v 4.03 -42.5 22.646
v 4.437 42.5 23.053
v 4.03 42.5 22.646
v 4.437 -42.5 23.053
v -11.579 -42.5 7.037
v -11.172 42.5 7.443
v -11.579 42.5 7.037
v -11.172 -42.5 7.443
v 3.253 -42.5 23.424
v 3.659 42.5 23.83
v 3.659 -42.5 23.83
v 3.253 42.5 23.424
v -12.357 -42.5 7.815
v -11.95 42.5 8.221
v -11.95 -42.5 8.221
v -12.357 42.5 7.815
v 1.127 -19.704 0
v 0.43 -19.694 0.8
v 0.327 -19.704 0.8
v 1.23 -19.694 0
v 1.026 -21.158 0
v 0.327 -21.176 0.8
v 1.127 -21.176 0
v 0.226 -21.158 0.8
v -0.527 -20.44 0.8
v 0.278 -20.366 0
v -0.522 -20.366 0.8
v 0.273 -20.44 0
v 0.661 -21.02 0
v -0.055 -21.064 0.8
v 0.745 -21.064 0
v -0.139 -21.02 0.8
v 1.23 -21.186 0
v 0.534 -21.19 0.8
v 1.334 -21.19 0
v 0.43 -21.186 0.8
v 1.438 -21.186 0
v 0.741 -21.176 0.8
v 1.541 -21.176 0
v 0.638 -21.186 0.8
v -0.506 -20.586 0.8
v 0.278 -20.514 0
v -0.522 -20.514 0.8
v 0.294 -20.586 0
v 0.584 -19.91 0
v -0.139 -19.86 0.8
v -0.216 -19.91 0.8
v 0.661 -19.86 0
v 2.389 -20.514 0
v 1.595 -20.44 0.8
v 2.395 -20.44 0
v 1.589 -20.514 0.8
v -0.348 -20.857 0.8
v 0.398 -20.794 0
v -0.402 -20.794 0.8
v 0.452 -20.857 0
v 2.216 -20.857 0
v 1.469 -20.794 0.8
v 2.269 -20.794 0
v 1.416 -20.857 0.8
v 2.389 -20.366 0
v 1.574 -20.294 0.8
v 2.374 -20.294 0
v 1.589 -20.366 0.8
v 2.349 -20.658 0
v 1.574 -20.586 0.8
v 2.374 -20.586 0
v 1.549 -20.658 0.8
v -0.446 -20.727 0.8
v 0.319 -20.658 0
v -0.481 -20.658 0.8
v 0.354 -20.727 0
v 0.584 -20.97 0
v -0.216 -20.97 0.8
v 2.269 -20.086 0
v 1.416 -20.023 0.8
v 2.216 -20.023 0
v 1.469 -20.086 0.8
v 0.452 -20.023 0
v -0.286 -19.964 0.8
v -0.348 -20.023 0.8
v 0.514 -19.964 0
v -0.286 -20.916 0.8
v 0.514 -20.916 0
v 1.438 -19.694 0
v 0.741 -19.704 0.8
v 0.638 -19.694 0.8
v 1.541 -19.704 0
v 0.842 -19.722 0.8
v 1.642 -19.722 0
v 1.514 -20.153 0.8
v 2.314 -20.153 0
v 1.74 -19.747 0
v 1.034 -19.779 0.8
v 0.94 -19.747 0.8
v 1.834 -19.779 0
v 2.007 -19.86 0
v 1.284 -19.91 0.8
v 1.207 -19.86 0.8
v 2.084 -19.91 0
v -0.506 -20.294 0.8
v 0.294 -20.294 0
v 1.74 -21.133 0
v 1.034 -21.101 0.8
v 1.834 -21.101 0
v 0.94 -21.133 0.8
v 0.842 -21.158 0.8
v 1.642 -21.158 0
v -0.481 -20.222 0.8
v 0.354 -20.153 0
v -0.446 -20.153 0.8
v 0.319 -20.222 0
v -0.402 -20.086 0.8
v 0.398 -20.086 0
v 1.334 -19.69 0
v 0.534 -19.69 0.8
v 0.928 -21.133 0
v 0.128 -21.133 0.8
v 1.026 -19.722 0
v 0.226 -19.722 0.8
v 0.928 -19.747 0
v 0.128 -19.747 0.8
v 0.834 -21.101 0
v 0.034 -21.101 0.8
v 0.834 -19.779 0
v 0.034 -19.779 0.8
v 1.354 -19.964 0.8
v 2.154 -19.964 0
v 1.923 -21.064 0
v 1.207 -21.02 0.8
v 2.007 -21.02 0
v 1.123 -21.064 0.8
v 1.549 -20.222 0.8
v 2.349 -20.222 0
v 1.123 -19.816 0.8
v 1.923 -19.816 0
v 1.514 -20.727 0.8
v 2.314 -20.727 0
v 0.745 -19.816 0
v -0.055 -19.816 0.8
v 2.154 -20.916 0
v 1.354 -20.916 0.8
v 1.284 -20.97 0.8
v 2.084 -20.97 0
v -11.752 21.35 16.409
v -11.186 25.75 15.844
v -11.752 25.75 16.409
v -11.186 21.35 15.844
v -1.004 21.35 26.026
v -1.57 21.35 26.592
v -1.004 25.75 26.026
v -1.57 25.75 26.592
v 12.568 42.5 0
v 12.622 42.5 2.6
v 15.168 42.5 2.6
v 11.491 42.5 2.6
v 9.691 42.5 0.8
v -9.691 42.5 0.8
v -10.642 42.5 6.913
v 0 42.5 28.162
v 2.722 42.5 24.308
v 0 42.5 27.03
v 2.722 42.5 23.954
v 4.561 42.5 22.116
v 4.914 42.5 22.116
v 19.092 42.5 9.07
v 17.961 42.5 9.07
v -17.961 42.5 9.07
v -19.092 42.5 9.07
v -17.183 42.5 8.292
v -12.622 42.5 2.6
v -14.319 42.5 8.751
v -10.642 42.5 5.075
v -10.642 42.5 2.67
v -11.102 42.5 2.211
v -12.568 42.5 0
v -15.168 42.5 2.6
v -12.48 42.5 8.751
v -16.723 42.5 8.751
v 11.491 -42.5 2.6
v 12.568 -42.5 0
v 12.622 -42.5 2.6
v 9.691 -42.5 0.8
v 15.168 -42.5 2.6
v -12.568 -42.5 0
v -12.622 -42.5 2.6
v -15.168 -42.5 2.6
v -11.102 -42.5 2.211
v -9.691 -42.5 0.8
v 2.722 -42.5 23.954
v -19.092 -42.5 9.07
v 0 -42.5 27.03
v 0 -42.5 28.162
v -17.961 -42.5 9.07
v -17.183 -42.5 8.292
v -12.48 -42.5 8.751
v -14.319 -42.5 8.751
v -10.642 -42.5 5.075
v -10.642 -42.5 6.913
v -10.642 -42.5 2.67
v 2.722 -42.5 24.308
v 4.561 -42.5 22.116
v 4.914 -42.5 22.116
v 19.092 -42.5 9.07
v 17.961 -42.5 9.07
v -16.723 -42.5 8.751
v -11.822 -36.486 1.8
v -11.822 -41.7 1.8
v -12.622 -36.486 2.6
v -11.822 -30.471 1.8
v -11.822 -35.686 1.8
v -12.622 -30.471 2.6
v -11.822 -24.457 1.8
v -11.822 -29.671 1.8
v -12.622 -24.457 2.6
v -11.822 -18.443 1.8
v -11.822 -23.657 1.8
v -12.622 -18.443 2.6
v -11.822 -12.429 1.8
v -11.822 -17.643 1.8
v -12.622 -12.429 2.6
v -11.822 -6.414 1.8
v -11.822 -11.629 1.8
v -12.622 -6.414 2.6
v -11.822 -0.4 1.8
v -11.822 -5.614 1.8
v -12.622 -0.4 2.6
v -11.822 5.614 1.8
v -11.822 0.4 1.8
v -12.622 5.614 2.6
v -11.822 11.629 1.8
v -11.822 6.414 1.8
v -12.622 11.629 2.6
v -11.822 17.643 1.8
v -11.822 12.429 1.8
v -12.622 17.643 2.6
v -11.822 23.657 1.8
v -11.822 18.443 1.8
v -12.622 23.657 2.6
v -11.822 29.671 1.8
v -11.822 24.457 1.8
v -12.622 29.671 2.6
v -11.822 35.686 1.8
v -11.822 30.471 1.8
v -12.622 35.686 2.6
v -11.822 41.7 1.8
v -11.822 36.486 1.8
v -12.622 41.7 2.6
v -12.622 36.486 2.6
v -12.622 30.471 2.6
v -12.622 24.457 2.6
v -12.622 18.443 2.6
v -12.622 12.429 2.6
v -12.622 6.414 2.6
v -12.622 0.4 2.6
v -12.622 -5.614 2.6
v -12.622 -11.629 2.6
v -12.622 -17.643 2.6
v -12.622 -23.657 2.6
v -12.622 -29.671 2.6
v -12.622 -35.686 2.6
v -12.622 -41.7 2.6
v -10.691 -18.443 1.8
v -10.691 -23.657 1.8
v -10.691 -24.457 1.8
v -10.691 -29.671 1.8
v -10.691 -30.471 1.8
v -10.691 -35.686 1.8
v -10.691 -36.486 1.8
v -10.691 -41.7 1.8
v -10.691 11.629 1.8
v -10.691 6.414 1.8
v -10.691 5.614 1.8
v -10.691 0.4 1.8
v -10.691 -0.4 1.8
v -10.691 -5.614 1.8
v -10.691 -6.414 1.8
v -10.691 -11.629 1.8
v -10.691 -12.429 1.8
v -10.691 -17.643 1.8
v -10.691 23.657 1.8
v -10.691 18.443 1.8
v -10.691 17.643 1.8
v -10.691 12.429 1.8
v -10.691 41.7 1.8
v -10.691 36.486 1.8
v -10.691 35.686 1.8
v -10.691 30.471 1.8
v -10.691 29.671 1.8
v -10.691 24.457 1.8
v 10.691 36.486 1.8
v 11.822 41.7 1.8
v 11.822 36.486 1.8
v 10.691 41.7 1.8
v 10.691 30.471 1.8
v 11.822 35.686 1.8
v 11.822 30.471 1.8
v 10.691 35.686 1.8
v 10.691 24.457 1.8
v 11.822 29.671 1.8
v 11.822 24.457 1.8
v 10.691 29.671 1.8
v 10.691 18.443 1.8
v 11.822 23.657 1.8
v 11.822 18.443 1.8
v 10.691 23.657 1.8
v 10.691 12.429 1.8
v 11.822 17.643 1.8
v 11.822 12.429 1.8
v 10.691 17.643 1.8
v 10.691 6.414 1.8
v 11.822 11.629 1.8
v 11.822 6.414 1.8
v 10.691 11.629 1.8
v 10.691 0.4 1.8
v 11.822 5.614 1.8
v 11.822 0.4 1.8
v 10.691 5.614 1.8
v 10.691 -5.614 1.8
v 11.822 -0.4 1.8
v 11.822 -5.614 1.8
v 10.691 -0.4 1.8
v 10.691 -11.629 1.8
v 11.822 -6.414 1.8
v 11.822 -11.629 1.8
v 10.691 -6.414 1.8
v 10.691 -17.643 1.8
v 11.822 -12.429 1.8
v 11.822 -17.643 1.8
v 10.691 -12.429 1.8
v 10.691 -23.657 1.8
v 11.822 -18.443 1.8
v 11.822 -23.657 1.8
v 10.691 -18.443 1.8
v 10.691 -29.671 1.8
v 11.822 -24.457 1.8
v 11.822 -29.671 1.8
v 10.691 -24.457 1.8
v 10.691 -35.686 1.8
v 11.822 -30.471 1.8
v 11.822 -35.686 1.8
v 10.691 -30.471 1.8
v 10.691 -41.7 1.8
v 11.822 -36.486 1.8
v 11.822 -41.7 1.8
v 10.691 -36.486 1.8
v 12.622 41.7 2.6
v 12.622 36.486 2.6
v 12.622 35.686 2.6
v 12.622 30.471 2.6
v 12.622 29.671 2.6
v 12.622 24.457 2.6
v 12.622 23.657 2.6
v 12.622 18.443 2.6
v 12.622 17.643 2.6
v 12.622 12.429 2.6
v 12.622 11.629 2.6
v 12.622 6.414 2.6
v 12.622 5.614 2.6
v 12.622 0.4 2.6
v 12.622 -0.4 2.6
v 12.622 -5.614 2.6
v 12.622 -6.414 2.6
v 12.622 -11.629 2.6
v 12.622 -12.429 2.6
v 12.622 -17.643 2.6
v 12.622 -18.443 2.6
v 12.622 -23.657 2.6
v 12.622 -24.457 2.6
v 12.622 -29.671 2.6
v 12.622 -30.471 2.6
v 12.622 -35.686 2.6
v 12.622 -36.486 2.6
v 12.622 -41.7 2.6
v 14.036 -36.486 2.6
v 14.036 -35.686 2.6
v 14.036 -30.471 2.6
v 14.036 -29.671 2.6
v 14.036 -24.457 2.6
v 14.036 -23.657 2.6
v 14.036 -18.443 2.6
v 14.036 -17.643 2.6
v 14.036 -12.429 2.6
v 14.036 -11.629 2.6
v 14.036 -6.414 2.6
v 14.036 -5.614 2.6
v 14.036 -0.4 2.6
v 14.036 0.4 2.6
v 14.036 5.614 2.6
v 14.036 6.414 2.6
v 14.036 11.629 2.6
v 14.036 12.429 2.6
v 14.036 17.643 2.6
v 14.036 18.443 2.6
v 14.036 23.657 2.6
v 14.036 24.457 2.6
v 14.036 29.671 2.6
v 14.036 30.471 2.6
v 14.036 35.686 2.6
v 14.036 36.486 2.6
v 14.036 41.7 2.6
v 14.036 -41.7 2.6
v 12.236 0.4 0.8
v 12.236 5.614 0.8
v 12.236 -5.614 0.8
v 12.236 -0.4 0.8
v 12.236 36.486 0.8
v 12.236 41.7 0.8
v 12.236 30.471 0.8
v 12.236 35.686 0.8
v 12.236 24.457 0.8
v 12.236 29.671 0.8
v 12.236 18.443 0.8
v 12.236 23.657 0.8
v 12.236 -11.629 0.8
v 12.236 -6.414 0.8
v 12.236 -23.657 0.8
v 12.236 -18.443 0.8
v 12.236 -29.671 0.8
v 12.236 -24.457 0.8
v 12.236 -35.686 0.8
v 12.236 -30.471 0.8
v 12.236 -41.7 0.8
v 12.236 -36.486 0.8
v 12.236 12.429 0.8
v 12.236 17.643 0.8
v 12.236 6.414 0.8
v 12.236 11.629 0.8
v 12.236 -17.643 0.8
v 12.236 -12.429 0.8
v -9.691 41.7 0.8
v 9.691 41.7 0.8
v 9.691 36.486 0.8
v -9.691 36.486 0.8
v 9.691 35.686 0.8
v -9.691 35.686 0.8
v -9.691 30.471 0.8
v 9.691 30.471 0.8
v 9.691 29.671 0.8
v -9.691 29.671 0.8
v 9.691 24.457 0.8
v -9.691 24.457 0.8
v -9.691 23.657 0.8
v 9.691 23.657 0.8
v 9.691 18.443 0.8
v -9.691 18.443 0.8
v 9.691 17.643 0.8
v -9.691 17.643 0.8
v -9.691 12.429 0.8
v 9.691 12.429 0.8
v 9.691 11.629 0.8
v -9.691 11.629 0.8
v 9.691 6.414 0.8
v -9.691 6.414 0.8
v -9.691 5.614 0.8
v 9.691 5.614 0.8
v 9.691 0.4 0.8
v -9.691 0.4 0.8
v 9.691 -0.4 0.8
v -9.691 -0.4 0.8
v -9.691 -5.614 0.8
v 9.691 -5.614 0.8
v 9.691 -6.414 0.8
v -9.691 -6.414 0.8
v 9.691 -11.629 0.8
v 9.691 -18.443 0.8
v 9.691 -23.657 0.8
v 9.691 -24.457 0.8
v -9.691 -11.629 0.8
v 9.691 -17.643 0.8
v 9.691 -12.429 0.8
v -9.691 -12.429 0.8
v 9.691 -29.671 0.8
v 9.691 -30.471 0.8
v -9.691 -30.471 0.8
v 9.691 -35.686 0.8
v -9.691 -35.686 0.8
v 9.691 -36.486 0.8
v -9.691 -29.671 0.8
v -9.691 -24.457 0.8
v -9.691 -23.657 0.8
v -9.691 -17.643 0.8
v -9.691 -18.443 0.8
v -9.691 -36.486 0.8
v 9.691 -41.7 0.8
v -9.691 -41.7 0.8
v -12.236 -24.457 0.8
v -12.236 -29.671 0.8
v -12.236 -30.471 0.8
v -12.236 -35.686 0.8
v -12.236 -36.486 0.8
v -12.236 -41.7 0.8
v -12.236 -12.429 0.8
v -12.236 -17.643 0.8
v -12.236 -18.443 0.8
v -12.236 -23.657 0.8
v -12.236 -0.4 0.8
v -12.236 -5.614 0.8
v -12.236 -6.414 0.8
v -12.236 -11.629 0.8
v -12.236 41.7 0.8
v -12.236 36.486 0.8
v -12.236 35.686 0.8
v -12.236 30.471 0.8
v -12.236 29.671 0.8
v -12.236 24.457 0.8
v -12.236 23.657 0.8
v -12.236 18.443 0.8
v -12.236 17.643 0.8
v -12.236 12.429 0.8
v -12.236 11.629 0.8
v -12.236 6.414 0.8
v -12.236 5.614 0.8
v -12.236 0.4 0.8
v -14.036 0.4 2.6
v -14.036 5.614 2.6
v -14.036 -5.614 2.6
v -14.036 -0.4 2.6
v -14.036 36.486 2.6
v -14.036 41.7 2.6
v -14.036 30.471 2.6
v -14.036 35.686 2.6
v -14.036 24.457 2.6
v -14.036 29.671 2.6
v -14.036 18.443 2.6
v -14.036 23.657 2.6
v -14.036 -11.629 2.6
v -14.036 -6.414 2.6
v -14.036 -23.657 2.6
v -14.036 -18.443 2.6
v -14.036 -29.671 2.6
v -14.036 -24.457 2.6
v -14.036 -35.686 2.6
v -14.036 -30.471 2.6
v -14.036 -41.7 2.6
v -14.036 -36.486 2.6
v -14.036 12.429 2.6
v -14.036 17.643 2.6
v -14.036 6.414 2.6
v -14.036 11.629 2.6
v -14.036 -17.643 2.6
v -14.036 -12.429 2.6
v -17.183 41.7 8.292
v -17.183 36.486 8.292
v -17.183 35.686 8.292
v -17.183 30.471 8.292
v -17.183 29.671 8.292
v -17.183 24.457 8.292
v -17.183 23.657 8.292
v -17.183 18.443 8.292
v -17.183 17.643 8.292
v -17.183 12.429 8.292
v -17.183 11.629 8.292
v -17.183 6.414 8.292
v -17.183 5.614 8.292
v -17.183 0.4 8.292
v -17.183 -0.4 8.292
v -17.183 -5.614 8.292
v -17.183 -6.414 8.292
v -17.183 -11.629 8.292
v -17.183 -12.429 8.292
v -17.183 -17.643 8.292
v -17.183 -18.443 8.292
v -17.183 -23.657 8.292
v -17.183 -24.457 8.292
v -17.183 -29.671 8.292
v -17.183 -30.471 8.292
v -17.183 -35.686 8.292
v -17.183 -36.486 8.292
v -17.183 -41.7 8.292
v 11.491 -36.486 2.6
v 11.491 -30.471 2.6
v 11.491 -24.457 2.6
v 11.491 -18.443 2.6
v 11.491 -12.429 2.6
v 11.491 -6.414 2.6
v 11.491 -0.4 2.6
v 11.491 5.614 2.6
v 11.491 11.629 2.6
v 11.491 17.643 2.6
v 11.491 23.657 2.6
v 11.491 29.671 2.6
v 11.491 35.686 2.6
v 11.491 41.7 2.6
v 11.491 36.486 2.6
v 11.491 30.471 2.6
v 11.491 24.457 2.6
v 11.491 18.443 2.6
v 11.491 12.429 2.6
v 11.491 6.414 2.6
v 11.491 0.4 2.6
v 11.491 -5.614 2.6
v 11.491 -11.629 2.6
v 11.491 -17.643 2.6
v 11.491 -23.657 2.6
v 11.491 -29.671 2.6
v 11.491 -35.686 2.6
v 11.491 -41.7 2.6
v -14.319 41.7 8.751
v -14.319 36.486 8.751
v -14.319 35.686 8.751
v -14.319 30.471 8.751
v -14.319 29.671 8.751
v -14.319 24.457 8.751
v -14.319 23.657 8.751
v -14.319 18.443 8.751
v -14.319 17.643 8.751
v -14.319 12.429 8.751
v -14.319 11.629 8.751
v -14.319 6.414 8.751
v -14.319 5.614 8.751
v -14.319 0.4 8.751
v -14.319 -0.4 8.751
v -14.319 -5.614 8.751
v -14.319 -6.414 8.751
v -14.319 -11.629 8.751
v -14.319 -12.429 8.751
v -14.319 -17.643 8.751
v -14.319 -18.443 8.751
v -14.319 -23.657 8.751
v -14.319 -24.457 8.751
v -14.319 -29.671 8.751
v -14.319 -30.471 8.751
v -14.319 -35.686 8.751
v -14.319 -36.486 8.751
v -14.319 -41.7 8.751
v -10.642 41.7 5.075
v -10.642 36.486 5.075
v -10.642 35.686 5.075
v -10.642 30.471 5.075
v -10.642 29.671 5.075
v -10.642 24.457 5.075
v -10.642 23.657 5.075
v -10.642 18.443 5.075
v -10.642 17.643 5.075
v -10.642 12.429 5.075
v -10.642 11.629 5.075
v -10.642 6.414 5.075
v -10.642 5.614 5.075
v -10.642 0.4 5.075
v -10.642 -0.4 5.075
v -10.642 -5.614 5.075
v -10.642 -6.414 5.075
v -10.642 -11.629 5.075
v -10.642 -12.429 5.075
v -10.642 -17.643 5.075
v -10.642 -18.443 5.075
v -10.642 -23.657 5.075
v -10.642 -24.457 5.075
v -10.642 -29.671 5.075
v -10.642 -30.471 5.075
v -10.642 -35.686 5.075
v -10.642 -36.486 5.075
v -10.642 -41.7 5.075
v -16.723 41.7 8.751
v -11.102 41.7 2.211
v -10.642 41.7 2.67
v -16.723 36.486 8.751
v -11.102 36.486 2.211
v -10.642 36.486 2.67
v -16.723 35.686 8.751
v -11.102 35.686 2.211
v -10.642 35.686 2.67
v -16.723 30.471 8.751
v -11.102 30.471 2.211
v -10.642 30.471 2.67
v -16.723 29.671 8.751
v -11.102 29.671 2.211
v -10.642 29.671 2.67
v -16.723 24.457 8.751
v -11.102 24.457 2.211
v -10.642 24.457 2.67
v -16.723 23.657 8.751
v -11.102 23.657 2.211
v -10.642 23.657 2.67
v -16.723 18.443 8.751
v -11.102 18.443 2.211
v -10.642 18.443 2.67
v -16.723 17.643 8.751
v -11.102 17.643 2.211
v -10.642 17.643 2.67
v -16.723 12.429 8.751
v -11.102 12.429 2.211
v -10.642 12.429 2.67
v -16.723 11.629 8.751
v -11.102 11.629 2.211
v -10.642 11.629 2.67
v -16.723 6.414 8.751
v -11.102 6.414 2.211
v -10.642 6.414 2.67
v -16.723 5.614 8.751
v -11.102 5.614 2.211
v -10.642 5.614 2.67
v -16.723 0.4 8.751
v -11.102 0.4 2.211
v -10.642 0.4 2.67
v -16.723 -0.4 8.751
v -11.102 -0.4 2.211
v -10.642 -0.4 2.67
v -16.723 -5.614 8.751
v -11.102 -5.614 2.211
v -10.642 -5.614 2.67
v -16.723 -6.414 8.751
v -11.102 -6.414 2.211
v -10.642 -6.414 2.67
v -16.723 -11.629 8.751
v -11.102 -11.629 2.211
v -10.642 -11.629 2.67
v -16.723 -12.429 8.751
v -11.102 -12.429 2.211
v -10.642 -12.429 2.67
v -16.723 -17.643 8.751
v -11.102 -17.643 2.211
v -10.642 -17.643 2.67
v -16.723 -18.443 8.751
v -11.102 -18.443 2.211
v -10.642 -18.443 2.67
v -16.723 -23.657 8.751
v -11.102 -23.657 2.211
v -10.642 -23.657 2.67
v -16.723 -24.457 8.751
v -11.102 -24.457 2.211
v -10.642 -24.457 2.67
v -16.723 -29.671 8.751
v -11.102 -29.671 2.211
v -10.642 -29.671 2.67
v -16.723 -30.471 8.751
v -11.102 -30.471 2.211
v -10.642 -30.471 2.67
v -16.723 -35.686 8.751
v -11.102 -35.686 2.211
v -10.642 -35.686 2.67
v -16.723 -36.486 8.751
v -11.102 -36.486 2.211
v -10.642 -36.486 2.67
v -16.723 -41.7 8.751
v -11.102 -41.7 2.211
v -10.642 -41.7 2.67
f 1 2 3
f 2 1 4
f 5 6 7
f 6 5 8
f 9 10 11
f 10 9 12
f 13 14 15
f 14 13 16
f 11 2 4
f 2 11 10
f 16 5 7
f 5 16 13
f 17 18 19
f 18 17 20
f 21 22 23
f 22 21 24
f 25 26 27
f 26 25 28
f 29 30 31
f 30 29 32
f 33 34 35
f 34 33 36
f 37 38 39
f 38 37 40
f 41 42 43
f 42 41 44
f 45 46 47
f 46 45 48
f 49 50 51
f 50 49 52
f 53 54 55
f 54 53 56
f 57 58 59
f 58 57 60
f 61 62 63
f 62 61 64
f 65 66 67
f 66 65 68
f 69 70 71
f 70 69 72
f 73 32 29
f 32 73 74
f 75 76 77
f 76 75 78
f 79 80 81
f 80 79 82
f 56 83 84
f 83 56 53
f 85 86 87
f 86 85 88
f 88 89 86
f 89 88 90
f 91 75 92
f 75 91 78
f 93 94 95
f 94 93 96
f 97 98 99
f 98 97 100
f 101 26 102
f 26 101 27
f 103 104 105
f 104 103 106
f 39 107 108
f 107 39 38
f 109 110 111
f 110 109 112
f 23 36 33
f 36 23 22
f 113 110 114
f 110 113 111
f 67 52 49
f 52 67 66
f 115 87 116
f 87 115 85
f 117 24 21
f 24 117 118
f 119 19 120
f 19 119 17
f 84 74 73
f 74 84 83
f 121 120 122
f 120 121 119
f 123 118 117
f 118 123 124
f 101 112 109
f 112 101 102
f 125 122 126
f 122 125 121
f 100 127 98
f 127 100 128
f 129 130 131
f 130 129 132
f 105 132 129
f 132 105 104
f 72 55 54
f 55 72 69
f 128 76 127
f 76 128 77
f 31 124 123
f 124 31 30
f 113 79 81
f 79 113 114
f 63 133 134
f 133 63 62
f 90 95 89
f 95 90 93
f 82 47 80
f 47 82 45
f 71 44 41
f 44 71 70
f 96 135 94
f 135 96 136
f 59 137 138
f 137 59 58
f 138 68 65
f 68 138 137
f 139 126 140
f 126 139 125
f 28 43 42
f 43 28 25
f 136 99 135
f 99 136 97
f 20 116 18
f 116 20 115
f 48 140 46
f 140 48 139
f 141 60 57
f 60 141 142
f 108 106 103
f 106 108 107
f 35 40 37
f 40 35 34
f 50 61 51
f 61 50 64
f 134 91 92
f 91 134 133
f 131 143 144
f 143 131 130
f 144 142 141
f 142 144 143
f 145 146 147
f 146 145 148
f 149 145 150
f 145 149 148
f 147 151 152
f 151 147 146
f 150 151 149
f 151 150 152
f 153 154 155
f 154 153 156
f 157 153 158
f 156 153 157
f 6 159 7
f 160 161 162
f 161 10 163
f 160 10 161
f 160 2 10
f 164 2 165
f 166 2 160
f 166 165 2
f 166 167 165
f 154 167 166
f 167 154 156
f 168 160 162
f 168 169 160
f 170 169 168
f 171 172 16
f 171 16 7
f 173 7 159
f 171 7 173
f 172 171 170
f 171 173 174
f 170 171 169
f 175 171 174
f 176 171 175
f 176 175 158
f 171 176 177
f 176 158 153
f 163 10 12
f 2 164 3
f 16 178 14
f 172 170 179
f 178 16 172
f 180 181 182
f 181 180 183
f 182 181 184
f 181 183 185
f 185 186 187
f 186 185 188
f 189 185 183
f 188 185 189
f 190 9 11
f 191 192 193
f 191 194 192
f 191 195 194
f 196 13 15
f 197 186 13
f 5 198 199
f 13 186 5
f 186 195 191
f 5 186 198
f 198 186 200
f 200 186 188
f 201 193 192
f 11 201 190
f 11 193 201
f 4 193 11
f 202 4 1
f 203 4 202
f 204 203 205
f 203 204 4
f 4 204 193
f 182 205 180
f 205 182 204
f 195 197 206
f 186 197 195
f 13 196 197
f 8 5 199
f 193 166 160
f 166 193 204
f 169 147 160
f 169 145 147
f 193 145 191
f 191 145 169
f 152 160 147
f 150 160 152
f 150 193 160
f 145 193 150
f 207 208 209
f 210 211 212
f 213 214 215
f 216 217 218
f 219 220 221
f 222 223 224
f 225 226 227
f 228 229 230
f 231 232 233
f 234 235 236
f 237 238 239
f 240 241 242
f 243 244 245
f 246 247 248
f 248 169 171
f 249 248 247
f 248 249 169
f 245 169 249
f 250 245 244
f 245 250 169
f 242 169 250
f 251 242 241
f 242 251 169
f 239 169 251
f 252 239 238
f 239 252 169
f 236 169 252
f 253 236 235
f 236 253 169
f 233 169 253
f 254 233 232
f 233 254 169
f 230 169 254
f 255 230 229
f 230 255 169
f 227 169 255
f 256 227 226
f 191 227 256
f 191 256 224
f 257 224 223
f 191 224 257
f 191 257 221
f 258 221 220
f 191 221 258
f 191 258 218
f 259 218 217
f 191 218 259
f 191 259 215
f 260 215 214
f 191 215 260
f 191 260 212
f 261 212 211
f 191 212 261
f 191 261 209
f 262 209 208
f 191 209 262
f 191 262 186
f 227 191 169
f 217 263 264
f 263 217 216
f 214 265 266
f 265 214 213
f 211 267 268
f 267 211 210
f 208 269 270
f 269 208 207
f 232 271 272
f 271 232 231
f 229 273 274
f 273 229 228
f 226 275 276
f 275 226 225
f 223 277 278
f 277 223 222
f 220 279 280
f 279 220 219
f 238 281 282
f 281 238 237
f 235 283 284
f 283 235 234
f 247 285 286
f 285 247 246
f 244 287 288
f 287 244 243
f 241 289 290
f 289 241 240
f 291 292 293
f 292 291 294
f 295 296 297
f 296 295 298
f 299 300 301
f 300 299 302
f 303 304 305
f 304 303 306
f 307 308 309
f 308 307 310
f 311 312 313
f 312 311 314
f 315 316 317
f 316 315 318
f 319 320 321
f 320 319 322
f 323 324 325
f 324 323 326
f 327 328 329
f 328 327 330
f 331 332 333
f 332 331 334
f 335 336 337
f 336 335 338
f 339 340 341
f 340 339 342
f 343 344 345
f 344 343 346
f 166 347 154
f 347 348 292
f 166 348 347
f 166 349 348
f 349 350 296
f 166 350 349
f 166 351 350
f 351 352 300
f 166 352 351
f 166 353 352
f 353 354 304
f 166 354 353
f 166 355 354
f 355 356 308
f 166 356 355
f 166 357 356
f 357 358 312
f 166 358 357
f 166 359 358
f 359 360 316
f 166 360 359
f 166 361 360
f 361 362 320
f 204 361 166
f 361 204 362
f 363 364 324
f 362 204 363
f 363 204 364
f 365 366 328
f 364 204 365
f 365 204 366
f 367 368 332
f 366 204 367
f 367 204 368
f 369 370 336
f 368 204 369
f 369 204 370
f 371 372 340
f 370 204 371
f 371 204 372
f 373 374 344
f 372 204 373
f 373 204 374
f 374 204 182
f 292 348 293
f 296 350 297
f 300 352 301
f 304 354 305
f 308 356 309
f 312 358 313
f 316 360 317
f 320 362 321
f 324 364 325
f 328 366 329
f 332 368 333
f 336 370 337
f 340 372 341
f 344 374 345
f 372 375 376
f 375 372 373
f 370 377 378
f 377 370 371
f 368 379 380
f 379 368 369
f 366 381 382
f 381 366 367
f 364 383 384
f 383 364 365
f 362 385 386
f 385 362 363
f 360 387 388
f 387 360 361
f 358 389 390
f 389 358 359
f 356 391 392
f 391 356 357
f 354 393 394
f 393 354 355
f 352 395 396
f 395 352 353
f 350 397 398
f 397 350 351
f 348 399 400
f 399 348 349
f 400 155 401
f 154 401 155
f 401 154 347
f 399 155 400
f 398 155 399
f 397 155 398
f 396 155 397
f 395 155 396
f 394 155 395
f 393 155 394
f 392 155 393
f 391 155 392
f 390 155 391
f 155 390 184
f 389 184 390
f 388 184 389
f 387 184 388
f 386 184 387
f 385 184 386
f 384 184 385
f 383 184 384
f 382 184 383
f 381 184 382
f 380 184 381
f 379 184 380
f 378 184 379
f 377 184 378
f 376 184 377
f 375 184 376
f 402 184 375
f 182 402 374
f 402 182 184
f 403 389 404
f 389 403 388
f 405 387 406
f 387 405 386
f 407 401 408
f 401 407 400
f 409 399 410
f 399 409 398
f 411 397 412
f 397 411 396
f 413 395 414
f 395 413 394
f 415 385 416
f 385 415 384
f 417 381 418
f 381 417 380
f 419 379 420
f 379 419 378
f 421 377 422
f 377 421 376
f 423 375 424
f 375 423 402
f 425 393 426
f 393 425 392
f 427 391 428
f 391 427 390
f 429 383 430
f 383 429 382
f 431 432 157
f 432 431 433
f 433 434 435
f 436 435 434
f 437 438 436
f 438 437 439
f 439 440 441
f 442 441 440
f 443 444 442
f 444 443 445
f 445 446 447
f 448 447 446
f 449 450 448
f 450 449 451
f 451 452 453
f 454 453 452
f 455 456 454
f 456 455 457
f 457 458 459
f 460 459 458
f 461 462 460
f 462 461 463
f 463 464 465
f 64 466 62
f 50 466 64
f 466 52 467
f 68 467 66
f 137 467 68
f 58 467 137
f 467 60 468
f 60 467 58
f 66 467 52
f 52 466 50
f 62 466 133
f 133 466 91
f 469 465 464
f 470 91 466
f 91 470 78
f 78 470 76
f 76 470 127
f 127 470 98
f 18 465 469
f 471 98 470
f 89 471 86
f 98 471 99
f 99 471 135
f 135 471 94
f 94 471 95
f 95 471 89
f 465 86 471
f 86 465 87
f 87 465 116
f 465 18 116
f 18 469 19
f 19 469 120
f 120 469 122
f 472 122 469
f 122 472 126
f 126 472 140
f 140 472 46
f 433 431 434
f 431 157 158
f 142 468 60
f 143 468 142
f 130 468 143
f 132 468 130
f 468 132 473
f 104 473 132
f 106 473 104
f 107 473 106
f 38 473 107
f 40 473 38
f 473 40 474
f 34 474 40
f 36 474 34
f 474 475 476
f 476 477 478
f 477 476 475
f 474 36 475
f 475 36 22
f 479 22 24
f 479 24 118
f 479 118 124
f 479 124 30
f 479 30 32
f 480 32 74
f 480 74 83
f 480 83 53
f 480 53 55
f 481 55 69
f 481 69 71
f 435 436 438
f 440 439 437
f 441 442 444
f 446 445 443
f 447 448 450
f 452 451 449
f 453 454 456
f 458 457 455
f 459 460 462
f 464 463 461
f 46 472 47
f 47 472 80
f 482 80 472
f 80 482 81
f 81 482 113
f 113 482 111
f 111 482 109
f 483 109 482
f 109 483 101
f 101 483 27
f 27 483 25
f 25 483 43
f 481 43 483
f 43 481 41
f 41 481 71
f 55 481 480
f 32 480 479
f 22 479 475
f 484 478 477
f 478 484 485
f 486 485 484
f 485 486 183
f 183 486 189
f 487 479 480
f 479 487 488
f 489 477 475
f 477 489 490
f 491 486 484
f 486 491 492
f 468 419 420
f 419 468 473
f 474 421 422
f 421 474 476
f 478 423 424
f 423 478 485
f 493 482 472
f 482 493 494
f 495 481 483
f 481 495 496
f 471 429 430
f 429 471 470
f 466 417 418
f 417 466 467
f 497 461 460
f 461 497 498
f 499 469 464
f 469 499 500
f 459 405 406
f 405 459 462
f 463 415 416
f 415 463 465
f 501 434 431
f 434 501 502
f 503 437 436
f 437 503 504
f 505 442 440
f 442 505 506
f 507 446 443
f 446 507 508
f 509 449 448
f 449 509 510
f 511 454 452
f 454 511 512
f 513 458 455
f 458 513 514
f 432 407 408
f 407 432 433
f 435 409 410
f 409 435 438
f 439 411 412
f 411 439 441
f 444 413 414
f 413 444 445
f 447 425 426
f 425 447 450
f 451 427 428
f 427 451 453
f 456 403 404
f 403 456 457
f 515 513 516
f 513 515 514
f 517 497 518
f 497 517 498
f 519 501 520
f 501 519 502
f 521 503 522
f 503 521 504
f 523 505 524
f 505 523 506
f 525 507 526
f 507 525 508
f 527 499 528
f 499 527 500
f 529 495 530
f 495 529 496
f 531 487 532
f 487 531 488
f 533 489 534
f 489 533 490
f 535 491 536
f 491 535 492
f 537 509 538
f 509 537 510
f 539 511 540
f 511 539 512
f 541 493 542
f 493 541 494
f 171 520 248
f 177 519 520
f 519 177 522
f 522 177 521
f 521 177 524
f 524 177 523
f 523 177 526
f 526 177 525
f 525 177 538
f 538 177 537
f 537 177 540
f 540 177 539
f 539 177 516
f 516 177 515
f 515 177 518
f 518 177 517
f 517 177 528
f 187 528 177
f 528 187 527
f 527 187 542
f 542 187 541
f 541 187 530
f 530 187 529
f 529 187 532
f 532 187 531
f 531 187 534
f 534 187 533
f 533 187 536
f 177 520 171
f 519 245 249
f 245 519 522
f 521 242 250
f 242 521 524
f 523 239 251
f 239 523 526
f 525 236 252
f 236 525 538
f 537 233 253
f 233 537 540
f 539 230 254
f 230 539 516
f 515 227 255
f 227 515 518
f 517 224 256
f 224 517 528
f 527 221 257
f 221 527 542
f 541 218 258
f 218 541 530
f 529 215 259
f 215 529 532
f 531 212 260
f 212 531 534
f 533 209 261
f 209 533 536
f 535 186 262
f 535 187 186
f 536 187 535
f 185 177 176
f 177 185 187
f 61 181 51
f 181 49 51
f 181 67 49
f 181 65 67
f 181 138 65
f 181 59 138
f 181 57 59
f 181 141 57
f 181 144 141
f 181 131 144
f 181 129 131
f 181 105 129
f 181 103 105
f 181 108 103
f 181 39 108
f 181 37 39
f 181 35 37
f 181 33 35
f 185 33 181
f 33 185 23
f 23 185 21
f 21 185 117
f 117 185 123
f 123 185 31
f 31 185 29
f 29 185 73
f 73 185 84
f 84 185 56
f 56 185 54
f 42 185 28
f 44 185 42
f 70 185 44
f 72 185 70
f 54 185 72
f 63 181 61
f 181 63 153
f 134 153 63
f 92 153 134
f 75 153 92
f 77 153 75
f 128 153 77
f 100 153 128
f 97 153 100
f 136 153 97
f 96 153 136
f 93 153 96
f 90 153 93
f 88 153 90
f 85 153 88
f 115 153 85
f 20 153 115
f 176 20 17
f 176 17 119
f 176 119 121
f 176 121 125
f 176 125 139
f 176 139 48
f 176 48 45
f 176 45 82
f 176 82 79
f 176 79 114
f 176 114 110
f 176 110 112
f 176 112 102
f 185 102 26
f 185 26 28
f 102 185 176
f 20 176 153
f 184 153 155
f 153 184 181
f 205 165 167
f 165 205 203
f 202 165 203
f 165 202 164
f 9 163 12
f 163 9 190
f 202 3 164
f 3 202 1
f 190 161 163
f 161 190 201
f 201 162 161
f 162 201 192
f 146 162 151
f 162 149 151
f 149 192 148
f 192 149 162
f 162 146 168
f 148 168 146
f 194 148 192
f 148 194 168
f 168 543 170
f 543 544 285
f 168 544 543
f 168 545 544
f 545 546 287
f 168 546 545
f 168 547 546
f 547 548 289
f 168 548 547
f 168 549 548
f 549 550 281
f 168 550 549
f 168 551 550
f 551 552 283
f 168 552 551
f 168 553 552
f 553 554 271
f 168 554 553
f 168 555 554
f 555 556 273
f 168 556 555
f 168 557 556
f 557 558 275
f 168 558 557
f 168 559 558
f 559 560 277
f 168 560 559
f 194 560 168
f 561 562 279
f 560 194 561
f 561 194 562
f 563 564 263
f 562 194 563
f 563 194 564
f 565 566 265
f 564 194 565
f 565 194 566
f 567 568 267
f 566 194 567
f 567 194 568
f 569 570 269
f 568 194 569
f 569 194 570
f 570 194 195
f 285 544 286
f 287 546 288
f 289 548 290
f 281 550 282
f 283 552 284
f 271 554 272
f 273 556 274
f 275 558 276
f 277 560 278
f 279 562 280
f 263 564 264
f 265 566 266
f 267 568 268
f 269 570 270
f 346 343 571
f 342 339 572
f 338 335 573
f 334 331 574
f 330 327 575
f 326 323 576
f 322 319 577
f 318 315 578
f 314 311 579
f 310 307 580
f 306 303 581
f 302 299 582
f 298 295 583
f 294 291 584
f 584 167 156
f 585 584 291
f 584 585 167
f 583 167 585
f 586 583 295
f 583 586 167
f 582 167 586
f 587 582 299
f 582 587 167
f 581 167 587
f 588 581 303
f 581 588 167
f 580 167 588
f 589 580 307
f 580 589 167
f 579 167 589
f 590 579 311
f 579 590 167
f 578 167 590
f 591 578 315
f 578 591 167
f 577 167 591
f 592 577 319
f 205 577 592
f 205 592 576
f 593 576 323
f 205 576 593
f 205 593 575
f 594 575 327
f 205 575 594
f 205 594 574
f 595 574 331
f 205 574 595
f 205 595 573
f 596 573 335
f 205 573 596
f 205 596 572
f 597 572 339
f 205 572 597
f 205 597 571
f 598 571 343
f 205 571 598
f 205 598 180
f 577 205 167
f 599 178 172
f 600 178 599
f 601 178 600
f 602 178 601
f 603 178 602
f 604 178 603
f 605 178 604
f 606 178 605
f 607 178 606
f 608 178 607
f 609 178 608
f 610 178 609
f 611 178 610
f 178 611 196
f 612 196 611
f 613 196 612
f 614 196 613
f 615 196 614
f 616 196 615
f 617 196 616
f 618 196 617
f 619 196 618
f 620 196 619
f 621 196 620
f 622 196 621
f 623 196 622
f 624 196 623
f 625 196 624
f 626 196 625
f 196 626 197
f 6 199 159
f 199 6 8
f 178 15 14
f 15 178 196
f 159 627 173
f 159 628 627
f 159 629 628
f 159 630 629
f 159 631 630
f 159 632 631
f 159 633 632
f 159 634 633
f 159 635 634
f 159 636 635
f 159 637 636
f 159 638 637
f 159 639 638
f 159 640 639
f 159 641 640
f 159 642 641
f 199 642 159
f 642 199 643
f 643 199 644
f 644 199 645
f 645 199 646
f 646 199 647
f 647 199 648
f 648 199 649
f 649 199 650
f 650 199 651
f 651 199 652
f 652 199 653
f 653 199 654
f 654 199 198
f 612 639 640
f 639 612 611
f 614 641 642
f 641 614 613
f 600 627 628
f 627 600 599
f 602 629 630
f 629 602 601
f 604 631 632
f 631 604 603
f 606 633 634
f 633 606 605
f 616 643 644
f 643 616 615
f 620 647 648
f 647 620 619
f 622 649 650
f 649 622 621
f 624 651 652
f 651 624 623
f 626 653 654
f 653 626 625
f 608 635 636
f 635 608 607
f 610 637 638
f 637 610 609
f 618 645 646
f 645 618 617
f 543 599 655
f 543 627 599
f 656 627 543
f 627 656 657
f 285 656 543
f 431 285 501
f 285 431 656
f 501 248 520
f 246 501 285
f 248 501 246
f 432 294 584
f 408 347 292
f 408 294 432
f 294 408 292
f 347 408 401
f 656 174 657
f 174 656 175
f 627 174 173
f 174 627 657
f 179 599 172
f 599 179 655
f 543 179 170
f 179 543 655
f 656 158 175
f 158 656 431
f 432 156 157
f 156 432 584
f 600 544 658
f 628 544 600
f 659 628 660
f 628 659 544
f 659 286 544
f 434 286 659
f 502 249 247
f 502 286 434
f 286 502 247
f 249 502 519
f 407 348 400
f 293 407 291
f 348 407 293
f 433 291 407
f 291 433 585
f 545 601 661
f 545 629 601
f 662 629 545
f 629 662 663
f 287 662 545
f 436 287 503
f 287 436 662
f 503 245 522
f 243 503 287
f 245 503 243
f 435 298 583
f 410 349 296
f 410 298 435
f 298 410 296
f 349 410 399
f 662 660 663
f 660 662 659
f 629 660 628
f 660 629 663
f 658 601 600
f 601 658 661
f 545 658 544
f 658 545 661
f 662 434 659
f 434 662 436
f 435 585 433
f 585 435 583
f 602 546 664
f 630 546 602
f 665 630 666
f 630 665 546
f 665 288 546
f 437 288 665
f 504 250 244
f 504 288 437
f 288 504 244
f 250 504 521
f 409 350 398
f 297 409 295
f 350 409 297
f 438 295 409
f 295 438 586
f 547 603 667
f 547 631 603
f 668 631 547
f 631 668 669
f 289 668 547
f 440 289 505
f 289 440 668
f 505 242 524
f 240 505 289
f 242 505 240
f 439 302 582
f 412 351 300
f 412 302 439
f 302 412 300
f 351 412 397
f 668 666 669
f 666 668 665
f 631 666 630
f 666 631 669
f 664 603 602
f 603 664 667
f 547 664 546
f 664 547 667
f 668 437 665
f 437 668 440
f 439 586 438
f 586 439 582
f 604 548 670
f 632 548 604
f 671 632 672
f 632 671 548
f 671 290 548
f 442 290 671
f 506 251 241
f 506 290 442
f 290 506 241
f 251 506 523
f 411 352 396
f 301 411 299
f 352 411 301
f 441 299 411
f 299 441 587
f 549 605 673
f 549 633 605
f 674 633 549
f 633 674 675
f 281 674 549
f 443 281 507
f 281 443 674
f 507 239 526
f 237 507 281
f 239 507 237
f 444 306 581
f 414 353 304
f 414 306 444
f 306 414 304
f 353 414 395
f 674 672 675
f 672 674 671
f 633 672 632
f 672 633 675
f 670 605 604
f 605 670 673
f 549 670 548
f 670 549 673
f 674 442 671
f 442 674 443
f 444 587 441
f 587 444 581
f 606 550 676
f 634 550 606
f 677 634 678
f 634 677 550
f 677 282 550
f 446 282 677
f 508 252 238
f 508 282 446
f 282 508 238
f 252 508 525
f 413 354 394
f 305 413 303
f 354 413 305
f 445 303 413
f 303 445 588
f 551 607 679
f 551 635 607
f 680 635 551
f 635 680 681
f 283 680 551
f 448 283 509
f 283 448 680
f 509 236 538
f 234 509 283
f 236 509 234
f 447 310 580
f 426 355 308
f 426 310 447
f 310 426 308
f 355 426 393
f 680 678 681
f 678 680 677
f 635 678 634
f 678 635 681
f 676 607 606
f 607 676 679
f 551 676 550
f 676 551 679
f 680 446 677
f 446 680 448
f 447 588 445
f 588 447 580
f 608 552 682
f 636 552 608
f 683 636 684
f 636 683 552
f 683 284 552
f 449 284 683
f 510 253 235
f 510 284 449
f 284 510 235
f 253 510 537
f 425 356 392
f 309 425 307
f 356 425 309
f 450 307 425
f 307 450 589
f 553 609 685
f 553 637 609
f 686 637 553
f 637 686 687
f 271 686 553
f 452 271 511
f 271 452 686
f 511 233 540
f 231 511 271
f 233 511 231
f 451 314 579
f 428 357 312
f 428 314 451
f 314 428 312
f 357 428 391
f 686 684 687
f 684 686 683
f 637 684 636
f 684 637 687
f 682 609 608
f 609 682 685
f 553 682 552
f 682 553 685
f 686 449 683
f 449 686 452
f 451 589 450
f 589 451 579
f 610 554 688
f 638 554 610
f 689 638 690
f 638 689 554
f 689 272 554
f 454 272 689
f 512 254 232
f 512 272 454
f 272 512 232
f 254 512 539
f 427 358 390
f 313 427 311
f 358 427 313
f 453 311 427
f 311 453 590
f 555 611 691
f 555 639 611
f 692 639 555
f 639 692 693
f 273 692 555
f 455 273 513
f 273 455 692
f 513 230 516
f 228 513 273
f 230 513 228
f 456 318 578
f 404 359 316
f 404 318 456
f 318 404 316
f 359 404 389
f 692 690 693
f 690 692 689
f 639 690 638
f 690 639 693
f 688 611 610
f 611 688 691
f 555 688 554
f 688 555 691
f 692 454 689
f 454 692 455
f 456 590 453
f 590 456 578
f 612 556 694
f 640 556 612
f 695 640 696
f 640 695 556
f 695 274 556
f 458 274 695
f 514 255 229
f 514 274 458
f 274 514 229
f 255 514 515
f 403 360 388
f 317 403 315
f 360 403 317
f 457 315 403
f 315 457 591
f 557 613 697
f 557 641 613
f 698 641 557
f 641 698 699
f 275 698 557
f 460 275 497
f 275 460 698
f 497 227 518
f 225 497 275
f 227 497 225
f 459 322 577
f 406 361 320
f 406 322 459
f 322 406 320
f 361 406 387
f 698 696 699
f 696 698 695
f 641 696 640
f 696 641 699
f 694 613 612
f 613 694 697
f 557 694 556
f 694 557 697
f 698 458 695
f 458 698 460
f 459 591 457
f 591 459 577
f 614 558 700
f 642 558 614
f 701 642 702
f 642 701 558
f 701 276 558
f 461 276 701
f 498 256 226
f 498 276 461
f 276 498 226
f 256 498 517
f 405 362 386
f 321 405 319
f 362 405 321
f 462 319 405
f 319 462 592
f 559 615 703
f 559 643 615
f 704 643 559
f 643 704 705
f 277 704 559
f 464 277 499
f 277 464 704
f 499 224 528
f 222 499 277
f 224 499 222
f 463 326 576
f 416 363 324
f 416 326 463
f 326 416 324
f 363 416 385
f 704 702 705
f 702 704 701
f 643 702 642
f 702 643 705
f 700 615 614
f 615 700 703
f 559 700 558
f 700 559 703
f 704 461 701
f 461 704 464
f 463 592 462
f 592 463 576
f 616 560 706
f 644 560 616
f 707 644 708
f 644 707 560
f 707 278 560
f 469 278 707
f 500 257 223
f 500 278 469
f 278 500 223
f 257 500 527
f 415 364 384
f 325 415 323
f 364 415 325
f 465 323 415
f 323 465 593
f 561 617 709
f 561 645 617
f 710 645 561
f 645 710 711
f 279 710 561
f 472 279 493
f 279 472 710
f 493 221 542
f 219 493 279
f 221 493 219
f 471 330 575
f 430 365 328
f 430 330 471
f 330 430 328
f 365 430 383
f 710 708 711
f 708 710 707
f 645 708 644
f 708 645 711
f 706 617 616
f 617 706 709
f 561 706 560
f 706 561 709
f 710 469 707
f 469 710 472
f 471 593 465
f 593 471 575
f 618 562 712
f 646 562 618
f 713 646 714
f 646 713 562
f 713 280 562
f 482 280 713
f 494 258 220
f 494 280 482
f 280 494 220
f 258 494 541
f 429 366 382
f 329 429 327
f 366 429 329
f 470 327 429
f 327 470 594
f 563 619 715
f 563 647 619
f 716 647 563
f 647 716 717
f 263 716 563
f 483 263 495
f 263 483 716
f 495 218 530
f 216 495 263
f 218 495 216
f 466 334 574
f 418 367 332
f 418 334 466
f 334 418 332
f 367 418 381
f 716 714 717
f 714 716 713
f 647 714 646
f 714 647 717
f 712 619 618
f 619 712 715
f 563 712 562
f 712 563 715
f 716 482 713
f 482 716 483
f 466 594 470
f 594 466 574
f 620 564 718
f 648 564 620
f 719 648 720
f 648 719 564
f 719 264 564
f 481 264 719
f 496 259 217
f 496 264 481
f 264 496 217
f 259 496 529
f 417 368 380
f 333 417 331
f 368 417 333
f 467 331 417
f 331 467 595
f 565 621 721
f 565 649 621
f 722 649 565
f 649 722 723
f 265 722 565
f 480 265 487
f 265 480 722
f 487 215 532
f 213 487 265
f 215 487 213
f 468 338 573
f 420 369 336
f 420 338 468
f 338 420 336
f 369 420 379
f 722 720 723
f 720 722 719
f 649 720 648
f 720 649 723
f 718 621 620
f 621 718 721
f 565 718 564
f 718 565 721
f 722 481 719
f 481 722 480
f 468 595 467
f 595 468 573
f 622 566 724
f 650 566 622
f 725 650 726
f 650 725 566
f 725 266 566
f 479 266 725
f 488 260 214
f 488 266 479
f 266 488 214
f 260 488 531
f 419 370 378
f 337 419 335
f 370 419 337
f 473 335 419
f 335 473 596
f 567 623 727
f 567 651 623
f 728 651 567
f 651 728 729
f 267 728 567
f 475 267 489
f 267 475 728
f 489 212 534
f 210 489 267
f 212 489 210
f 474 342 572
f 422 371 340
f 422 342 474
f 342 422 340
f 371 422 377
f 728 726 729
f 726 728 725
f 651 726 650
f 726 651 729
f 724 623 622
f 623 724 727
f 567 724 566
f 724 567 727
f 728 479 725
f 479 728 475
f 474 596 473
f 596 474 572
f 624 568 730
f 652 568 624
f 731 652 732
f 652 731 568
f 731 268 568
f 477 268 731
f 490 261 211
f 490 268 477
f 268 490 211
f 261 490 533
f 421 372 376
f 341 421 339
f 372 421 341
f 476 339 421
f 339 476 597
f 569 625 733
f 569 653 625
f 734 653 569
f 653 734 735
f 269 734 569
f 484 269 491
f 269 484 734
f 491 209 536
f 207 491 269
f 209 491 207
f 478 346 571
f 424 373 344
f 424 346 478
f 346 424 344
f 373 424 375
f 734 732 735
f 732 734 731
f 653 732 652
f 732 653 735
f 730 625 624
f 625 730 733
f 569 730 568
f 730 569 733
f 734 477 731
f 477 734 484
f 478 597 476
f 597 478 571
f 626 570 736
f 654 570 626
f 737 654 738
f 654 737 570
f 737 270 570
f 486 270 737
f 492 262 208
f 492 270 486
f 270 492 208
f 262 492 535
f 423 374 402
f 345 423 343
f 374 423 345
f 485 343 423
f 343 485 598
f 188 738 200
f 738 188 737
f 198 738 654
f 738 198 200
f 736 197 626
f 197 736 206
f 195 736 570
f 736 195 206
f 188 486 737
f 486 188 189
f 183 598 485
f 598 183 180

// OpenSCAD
$fn=64;

X_AXIS = [1, 0, 0];
Y_AXIS = [0, 1, 0];
Z_AXIS = [0, 0, 1];

BIAS = 0.01;

pcb_board_height    = 22.5;
pcb_board_thickness =  1.0;


angle_profile_thickness =  1.3;
angle_profile_size      = 25.4;
angle_profile_angle     = 90.0;

angle_profile_height    = 30.0;

pcb_mid_to_angle_profile_side=13.1;
pcb_bottom_to_angle_profile_side=7.5;

case_long_side = 27;
case_thickness = 0.8;
case_air_gap = 1.0;

case_tube_length=100-15;

supports=15;

*center_pcb();
*angle_profile();
*angle_profile_2D();
*loc_rot_pcb() center_pcb();

difference() {
    case();
    case_inner();
    loc_rot_pcb() center_pcb();
    
}
rotate(90, X_AXIS) repeat_supports(supports, case_tube_length) {
    intersection() {
        loc_rot_angle_profile_side() {
            translate([pcb_bottom_to_angle_profile_side,
                       -pcb_mid_to_angle_profile_side])
            {
                rotate(90) {
                    pcb_slider_2D(true);
                }
            }
            
        }
        case_inner_2D();
    }
    case_support_2D();
}
    

module loc_rot_pcb() {
    translate([0,0,angle_profile_height]) rotate(135, Y_AXIS) {
        translate([pcb_mid_to_angle_profile_side,
                   0, pcb_bottom_to_angle_profile_side])
        {
            rotate(90) children();
        }
    }
}

module case(l=case_tube_length, n=supports) {
    render(3) rotate(90, X_AXIS) {
        linear_extrude(l, center=true) {
            case_2D();
        }
    }
}

module repeat_supports(n, l) {
    for (i=[0:n-1]) {
        translate([0,0, -l/2 + i * (l-case_thickness)/(n-1)]) {
            linear_extrude(case_thickness) {
                children();
            }
        }
    }
}

module case_inner(l=100-15) {
    rotate(90, X_AXIS) {
        linear_extrude(l + 2*BIAS, center=true) {
            case_inner_2D();
        }
    }
}
module case_support_2D() {
    intersection() {
        difference() {
            // Outer diamond
            loc_rot_angle_profile_side() {
                translate([angle_profile_thickness,
                    -angle_profile_thickness])
                {
                    aligned_square(
                        case_long_side + case_air_gap + case_thickness,
                        [0,1]);
                }
            }
            // Remove inner diamond
            loc_rot_angle_profile_side() {
                translate([angle_profile_thickness,
                    -angle_profile_thickness])
                {
                    aligned_square(
                        case_long_side - case_thickness,
                        [0,1]);
                }
            }
        }
        // Only keep the slice we need
        aligned_square(
            [2*case_long_side, case_air_gap + 2*case_thickness],
            [.5,0]);
    }
}

module case_inner_2D() {
    difference() {
        // Diamond
        loc_rot_angle_profile_side() {
            translate([angle_profile_thickness+case_thickness,
                -angle_profile_thickness-case_thickness])
            {
                aligned_square(
                    case_long_side - 2*case_thickness,
                    [0,1]);
            }
        }
        // But not remove bottom wall
        translate([0, case_thickness]) {
            aligned_square(
                [case_long_side*1.5, case_long_side/2], 
                [.5, 1]);
        }
        // But not the slider for the PCB
        loc_rot_angle_profile_side() {
            translate([pcb_bottom_to_angle_profile_side,
                       -pcb_mid_to_angle_profile_side])
            {
                rotate(-90) pcb_slider_2D(true);
            }
        }
    }
}
module pcb_slider_2D(b=false) {
    overlap = 0.5;
    rim = 0.8;
    thickness = 3.0;
    difference() {
        copy_mirror() translate([pcb_board_height/2,0]) {
            polygon([
                [-overlap, pcb_board_thickness/2 + rim],
                [-overlap + thickness, 
                 pcb_board_thickness/2 + rim + thickness],
                [case_long_side/2, 
                 pcb_board_thickness/2 + rim + thickness],
                [case_long_side/2, 
                 -(pcb_board_thickness/2 + rim + thickness)],
                [-overlap + thickness, 
                 -(pcb_board_thickness/2 + rim + thickness)],
                [-overlap, -(pcb_board_thickness/2 + rim)]
            ]);
        }
        // Keep a air gap
        if(b) {
            translate([pcb_board_height/2+rim,0]) {
                aligned_square(case_long_side,[0,.5]);
            }
        }
    }
}

module case_2D() {
    // Top
    difference() {
        // Outer diamond
        loc_rot_angle_profile_side() {
            translate([angle_profile_thickness,
                -angle_profile_thickness])
            {
                aligned_square(case_long_side, [0,1]);
            }
        }
        // Remove inner diamond
        //case_inner_2D();
        
        // Remove bottom plus air-gap
        translate([0, case_thickness + case_air_gap]) {
            aligned_square(
                [case_long_side*1.5, case_long_side],
                [.5,1]);
        }
    }

    // Bottom
    intersection() {
        difference() {
            // Outer diamond
            loc_rot_angle_profile_side() {
                translate([angle_profile_thickness,
                    -angle_profile_thickness])
                {
                    aligned_square(
                        case_long_side + case_air_gap + case_thickness,
                        [0,1]);
                }
            }
            // Remove inner diamond
            difference() {
                loc_rot_angle_profile_side() {
                    translate([angle_profile_thickness,
                        -angle_profile_thickness])
                    {
                        aligned_square(
                            case_long_side + case_air_gap,
                            [0,1]);
                    }
                }
                // But not remove bottom wall
                translate([0, case_thickness]) {
                    aligned_square(
                        [case_long_side*1.5, case_long_side/2], 
                        [.5, 1]);
                }
            }
        }
        // Only keep the slice we need
        aligned_square(
            [2*case_long_side, case_air_gap + 2*case_thickness],
            [.5,0]);
    }
}

module angle_profile(l=150, center=true) {
    rotate(90, X_AXIS) {
        linear_extrude(l, center=center) {
            angle_profile_2D();
        }
    }
}
module angle_profile_2D() {
    color([.95,.95,.95]) difference() {
        copy_mirror() loc_rot_angle_profile_side() {
            aligned_square(
                [angle_profile_size, angle_profile_thickness],
                [0, 1]);
        }
        copy_mirror() loc_rot_angle_profile_side() {
            aligned_square(
                [angle_profile_size, angle_profile_thickness],
                [0, 0]);
        }
    }
}

module loc_rot_angle_profile_side() {
    translate([0, angle_profile_height]) {
        rotate(-90 + angle_profile_angle /2) {
            children();
        }
    }
}

module center_pcb() {
    pcb_board();
    position([-42.12, -5.77], -90, "top")    Barrel_Jack_Switch();
    position([-46.60,  6.42],  90, "top")    Screw_Terminal_2_54(3);
    position([ 45.60, -8.63], -90, "top")    Screw_Terminal_2_54(2);
    position([ 45.60, -2.09], -90, "top")    Screw_Terminal_2_54(2);
    position([-20.44,  7.17], 180, "top")    Button_Switch_SMD();
    position([ 22.75, -8.18], 180, "bottom") PinSocket_2_00([2, 7]);
}

module pcb_board() {
    tolerance_xy   = 0.15; 
    tolerance_z    = 0.10;
    pcb_board_size = [100.0, pcb_board_height, pcb_board_thickness];
        
    color([.9,.9,.9]) cube(add_vec_vec(pcb_board_size, [
            tolerance_xy, tolerance_xy, tolerance_z]),
        center=true);
}

module Barrel_Jack_Switch(h=3) {
    color([.2,.2,.2]) rotate(0) {
        translate([-9.6/2, -7.2]) cube([9.6, 14.4, 11.2]);
        translate([0, 0, 6.5]) rotate(90, [1,0,0]) {
            cylinder(d=6.5, h=h+7.2);
        }
    }
}

module Screw_Terminal_2_54(p=2,h1=5,h2=20) {
    color([0.0,1.0,0.3]) rotate(180) for(i=[0:p-1]) translate([-i*2.54,0]) {
        cylinder(2.54-0.8,h=h2);
        rotate(180) {
            translate([-1,3.3, 0.5]) cube([2,h1,4]);
        }
    }
}

module Button_Switch_SMD() {
    color([1.0,1.0,0.0])
    cylinder(d=1.5, h=20);
}

module PinSocket_2_00(pins) {
    pitch  = 2.00;
    border = 0.4;
    
    size = [
        pins[0] * pitch + border,
        pins[1] * pitch + border];
    color([.2,.2,.2]) linear_extrude(6.51) {
        translate([-pitch/2-border, -pitch/2-border]) square(size);
    }
}

module position(loc, rot, side) {
    translate([loc[0], -loc[1]]) {
        rotate(rot, Z_AXIS) {
            if(side == "top") {
                translate([0,0, pcb_board_thickness/2]) {
                    children();
                }
            } else if (side == "bottom") {
                rotate(180, [0,1,0]) {
                    translate([0,0, pcb_board_thickness/2]) {
                        children();
                    }
                }
            } else {
                error(str("Parameter 'side' must have either ",
                          "value \"top\" or \"bottom\"."));
            }
        }
    }
}

module error(text) {
    echo(str("ERROR: ", text));
    
}

function add_vec_vec(vec1, vec2) = [
    for(i=[0:len(vec1)-1]) vec1[i] + vec2[i]
];

module copy_mirror(vec=undef) {
    children();
    mirror(vec) children();
}

echo(len(undef));

module aligned_square(vec, align=[.5,.5]) {
    if(vec != undef && len(vec) == undef) {
        aligned_square([vec, vec], align);
    } else {
        translate([-vec[0]*align[0], -vec[1]*align[1]]) {
            square(vec);
        }
    }
}
